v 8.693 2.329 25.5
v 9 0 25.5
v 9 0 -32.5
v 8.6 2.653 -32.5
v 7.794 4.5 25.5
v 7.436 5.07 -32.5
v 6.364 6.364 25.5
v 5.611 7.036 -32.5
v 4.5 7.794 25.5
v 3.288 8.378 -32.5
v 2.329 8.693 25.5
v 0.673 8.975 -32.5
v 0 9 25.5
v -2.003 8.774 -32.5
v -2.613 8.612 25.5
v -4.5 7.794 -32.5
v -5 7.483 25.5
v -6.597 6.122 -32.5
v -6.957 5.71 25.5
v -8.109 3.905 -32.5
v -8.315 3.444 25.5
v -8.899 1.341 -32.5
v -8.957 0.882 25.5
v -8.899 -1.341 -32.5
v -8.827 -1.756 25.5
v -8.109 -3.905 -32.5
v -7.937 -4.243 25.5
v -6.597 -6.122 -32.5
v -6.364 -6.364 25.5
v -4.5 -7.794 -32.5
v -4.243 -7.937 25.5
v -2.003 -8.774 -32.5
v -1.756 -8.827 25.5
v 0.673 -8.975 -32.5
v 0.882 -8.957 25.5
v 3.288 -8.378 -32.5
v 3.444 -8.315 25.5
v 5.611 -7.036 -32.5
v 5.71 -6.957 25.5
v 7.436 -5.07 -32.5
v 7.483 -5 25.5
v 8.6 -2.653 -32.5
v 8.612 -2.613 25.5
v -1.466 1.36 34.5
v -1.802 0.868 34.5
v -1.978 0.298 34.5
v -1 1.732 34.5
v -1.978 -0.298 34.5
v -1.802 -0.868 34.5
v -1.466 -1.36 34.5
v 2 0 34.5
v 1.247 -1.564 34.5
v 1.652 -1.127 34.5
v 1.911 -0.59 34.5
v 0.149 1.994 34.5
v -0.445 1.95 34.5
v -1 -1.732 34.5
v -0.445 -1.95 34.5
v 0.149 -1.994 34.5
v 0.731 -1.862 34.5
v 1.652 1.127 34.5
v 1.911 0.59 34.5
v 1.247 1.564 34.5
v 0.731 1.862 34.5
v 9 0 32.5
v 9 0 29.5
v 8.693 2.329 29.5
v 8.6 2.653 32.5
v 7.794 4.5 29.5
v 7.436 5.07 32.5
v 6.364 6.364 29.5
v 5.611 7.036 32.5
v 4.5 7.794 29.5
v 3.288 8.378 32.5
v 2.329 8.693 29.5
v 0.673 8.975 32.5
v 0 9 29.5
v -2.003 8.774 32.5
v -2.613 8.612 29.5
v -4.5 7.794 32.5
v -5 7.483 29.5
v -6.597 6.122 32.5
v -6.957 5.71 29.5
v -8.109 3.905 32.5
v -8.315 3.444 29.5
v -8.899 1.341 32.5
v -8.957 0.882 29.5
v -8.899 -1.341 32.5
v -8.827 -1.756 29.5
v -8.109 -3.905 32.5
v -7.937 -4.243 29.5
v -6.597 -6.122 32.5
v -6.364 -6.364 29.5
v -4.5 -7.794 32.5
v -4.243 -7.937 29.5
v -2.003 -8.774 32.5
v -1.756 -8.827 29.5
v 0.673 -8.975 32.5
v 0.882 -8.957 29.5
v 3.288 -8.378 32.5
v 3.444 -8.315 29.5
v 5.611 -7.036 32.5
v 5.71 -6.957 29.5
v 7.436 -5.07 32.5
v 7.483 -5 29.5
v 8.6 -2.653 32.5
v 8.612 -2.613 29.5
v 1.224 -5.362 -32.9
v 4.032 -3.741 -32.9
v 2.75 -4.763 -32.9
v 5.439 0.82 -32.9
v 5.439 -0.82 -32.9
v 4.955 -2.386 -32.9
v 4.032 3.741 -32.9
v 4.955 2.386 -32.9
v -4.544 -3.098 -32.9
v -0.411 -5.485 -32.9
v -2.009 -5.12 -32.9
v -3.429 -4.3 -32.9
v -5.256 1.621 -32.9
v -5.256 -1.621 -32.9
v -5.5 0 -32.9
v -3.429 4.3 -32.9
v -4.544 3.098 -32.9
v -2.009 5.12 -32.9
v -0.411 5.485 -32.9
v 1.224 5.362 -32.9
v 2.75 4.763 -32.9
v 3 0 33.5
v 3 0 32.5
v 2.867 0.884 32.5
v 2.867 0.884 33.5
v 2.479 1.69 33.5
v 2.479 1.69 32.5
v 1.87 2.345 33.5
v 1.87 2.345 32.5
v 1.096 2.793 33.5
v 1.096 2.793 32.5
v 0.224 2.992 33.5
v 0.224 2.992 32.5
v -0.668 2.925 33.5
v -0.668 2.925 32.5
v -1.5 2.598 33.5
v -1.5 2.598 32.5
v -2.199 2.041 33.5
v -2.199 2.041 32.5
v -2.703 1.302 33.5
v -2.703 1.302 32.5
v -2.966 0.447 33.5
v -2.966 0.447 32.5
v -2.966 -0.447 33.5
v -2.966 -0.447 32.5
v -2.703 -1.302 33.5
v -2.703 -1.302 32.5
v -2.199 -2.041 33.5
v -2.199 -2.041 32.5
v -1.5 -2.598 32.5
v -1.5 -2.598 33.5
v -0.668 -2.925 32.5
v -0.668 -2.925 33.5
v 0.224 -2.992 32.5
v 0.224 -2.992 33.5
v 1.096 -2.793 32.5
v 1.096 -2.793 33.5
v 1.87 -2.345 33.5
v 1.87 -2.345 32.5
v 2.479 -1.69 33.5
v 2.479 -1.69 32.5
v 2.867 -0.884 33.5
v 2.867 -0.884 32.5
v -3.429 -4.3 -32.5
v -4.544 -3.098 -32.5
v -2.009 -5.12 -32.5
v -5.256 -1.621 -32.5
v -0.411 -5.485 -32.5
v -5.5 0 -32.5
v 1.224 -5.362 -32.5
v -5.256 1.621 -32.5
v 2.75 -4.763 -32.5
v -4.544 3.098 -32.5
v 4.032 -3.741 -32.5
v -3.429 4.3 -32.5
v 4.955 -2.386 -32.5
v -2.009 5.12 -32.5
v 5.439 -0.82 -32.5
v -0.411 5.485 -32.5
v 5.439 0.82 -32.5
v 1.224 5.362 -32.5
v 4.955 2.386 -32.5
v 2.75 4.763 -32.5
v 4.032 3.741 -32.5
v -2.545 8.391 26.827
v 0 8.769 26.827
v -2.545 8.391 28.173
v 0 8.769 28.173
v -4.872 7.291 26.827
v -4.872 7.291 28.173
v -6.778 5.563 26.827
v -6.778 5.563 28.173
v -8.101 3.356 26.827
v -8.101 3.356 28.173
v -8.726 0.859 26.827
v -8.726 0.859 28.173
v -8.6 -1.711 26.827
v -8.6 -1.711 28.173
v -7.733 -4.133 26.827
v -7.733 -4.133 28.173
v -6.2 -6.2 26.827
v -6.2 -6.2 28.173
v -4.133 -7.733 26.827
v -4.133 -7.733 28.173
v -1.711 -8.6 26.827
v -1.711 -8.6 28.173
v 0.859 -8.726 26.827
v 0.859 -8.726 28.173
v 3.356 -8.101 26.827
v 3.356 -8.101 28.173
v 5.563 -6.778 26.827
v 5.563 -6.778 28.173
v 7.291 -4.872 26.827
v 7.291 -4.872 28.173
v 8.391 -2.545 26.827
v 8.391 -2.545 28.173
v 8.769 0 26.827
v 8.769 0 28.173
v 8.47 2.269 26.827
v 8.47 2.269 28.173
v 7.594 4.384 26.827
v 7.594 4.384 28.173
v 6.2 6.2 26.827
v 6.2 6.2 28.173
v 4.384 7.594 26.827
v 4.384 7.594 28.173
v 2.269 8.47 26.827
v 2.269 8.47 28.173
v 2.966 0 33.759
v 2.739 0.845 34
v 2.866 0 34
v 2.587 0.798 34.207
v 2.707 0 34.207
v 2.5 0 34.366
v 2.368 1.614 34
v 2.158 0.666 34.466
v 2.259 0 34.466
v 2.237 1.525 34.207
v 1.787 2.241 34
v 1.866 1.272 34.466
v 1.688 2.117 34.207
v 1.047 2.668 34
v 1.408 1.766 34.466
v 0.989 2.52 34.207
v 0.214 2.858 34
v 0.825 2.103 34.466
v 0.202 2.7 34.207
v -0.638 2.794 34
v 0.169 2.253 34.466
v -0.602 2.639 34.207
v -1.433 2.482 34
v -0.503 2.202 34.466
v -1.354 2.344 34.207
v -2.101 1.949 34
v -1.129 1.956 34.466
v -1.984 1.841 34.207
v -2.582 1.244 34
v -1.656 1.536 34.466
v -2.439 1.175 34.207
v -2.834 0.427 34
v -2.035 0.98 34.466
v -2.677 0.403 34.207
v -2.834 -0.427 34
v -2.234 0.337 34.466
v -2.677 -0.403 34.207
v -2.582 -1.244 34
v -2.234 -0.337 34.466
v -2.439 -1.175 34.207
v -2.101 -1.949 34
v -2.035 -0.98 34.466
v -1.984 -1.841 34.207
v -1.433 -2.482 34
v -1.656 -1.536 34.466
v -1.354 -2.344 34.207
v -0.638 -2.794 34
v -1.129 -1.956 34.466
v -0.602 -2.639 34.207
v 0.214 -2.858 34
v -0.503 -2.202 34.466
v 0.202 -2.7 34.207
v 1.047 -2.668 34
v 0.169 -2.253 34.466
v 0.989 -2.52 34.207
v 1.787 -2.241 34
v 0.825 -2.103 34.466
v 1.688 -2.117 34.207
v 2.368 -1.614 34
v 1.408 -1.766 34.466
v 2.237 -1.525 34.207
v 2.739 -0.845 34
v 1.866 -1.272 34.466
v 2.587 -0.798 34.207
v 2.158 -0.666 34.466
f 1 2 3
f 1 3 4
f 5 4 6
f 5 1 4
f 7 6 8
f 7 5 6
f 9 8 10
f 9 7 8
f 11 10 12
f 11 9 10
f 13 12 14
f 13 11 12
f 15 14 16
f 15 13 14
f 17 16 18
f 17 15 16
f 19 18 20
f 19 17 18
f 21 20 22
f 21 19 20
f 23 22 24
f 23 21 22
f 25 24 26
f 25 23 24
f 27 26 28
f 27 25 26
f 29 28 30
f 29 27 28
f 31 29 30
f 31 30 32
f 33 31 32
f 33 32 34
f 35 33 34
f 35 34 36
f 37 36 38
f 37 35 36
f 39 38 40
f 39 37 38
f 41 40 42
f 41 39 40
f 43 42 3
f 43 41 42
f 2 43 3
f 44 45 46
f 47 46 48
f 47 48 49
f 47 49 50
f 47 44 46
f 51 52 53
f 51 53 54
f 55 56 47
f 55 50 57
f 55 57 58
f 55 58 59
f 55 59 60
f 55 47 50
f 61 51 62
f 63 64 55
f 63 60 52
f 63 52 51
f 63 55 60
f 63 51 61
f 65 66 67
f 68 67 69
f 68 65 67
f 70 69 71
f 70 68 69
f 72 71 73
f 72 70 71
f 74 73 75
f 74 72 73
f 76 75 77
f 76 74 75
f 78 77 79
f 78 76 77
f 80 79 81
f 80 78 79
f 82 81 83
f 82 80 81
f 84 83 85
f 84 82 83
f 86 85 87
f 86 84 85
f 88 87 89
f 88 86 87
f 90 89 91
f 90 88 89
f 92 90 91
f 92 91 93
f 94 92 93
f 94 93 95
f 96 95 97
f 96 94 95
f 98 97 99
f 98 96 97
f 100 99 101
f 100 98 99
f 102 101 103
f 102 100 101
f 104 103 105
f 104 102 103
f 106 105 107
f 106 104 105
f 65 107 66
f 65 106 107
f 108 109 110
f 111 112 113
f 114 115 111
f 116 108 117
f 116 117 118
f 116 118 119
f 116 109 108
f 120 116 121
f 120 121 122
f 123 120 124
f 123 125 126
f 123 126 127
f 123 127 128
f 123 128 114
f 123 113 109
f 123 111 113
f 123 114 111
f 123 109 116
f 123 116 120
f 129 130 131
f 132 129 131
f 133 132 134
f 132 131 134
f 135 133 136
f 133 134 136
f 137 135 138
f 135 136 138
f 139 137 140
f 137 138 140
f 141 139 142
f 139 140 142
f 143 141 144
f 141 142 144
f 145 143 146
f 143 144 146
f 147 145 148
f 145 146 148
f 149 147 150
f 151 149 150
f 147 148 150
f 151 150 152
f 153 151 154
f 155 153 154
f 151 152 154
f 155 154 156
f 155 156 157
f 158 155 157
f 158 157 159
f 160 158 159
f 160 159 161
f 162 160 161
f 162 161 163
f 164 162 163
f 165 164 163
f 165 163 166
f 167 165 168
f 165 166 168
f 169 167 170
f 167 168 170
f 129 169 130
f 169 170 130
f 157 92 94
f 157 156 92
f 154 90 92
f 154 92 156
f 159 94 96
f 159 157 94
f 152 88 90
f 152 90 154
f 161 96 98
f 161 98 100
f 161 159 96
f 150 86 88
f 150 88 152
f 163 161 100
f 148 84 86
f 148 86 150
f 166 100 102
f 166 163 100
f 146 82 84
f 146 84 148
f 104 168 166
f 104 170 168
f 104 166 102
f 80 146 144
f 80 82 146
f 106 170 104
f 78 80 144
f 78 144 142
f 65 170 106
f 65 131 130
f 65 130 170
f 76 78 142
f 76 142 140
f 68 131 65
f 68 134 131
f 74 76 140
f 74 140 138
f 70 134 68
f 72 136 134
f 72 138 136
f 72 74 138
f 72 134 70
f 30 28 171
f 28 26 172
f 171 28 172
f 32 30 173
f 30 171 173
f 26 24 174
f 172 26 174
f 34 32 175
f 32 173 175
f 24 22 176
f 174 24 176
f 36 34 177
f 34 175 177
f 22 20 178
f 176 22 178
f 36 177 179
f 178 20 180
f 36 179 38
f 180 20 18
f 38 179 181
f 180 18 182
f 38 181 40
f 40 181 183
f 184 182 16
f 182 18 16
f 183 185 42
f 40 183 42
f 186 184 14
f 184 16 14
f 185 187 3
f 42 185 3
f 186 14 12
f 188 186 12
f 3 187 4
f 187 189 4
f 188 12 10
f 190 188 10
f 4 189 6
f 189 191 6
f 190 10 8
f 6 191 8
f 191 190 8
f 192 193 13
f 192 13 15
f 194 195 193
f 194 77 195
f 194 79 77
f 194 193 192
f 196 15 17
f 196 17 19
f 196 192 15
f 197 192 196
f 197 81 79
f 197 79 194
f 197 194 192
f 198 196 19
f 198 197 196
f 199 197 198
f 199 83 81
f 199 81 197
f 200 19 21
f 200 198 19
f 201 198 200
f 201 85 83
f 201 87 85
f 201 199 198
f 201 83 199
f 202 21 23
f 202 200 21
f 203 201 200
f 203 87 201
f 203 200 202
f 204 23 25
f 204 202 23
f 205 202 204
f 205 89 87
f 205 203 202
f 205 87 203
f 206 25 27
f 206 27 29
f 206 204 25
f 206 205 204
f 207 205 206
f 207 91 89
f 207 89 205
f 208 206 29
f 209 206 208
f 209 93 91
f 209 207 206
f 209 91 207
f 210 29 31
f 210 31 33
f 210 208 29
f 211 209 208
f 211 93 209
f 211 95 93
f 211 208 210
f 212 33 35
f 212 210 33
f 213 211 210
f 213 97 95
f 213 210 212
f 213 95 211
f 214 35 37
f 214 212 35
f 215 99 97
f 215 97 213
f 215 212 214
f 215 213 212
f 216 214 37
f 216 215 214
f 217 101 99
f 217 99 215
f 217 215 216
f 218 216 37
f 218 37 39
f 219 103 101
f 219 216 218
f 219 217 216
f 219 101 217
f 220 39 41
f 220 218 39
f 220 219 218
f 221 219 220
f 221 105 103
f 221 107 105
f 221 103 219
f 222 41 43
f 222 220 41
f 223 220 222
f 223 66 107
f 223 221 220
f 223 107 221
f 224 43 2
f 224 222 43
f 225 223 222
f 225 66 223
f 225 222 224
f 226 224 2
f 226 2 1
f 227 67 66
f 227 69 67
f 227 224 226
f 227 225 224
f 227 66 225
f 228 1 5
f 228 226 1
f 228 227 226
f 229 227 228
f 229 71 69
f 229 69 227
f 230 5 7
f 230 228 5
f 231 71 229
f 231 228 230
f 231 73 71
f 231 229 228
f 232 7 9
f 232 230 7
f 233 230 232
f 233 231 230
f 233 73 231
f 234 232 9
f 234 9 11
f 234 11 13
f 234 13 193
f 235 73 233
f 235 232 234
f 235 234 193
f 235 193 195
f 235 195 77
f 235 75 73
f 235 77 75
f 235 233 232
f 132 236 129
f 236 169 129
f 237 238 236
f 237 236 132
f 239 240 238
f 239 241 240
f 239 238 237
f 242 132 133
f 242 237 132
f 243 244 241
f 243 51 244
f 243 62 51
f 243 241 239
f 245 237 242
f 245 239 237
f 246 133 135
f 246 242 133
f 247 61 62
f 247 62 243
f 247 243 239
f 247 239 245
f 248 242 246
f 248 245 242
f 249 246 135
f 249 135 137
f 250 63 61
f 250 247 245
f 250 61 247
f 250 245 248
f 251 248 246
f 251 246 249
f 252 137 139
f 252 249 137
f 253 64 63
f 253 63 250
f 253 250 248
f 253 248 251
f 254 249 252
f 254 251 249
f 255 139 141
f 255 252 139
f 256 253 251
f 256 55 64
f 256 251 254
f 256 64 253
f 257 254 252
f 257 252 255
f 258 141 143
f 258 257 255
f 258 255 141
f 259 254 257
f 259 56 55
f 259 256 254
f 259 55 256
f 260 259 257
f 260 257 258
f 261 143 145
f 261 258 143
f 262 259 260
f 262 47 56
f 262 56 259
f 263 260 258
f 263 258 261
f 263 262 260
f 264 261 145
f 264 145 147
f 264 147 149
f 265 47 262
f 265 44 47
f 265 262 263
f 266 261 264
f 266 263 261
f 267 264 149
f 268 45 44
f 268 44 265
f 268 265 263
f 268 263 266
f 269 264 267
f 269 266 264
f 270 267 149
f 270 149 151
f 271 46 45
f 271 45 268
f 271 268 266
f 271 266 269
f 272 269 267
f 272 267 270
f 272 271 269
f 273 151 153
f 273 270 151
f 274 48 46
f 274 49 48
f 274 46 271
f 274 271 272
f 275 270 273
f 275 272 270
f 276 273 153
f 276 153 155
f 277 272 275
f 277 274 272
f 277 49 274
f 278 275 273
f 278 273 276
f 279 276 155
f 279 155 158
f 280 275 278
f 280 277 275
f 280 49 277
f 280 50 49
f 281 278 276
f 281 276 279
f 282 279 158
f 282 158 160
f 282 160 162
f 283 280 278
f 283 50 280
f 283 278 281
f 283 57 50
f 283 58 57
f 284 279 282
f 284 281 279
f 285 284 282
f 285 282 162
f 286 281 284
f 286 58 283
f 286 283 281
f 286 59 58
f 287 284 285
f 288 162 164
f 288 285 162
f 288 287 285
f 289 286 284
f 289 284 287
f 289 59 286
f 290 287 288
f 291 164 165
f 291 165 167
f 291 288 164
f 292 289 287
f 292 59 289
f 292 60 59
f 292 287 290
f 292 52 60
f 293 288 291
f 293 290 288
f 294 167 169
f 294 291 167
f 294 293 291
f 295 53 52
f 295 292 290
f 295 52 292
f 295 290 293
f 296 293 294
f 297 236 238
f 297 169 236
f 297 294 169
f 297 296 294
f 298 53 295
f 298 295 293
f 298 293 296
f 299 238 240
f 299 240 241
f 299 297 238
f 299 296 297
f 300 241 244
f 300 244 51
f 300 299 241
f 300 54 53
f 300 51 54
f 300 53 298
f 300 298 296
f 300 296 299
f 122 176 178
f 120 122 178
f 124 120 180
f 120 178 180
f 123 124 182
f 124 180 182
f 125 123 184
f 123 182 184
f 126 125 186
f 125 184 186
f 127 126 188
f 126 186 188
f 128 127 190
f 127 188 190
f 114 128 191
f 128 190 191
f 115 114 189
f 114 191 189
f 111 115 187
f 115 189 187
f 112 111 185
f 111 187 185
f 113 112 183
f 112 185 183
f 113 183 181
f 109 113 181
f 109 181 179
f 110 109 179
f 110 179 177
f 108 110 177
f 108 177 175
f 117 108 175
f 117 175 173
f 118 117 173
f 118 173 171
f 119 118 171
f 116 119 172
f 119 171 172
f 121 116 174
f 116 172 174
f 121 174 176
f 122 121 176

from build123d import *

# Parameters (mm, degrees)
ESBO_O1_R                = 9
RESSALTO_EXTRUS_O1_DEPTH = 32.5
ESBO_O2_R                = 3
RESSALTO_EXTRUS_O2_DEPTH = 2
FILETE1_R                = 1
ESBO_O4_R                = 5.5
RESSALTO_EXTRUS_O3_DEPTH = 0.4


with BuildPart() as part:
    # Esboço1 → Ressalto-extrusão1 (new body, symmetric)
    with BuildSketch(Plane.XY):
        Circle(ESBO_O1_R)
    extrude(amount=RESSALTO_EXTRUS_O1_DEPTH, both=True)

    # Esboço2 → Ressalto-extrusão2 (add)
    with BuildSketch(Plane.XY.offset(32.5)):
        Circle(ESBO_O2_R)
    extrude(amount=RESSALTO_EXTRUS_O2_DEPTH)

    # Filete1
    filete1_edges = [part.edges().sort_by_distance(p)[0] for p in [
        (-3, 0, 34.5),
    ]]
    fillet(filete1_edges, radius=FILETE1_R)

    # Esboço3 → Corte-Revolução1 (revolve, cut)
    with BuildSketch(Plane(origin=(0, 0, 0), x_dir=(0, 0, -1), z_dir=(1, 0, 0))):
        with BuildLine():
            Line((-29.5, 9), (-25.5, 9))
            ThreePointArc((-25.5, 9), (-27.5, 8.73940243), (-29.5, 9))
        make_face()
    revolve(axis=Axis((0, 0, 34.5), (0, 0, 1)), mode=Mode.SUBTRACT)

    # Esboço4 → Ressalto-extrusão3 (add)
    with BuildSketch(Plane(origin=(0, 0, -32.5), x_dir=(-1, 0, 0), z_dir=(0, 0, -1))):
        Circle(ESBO_O4_R)
    extrude(amount=RESSALTO_EXTRUS_O3_DEPTH)


solid = part.part
